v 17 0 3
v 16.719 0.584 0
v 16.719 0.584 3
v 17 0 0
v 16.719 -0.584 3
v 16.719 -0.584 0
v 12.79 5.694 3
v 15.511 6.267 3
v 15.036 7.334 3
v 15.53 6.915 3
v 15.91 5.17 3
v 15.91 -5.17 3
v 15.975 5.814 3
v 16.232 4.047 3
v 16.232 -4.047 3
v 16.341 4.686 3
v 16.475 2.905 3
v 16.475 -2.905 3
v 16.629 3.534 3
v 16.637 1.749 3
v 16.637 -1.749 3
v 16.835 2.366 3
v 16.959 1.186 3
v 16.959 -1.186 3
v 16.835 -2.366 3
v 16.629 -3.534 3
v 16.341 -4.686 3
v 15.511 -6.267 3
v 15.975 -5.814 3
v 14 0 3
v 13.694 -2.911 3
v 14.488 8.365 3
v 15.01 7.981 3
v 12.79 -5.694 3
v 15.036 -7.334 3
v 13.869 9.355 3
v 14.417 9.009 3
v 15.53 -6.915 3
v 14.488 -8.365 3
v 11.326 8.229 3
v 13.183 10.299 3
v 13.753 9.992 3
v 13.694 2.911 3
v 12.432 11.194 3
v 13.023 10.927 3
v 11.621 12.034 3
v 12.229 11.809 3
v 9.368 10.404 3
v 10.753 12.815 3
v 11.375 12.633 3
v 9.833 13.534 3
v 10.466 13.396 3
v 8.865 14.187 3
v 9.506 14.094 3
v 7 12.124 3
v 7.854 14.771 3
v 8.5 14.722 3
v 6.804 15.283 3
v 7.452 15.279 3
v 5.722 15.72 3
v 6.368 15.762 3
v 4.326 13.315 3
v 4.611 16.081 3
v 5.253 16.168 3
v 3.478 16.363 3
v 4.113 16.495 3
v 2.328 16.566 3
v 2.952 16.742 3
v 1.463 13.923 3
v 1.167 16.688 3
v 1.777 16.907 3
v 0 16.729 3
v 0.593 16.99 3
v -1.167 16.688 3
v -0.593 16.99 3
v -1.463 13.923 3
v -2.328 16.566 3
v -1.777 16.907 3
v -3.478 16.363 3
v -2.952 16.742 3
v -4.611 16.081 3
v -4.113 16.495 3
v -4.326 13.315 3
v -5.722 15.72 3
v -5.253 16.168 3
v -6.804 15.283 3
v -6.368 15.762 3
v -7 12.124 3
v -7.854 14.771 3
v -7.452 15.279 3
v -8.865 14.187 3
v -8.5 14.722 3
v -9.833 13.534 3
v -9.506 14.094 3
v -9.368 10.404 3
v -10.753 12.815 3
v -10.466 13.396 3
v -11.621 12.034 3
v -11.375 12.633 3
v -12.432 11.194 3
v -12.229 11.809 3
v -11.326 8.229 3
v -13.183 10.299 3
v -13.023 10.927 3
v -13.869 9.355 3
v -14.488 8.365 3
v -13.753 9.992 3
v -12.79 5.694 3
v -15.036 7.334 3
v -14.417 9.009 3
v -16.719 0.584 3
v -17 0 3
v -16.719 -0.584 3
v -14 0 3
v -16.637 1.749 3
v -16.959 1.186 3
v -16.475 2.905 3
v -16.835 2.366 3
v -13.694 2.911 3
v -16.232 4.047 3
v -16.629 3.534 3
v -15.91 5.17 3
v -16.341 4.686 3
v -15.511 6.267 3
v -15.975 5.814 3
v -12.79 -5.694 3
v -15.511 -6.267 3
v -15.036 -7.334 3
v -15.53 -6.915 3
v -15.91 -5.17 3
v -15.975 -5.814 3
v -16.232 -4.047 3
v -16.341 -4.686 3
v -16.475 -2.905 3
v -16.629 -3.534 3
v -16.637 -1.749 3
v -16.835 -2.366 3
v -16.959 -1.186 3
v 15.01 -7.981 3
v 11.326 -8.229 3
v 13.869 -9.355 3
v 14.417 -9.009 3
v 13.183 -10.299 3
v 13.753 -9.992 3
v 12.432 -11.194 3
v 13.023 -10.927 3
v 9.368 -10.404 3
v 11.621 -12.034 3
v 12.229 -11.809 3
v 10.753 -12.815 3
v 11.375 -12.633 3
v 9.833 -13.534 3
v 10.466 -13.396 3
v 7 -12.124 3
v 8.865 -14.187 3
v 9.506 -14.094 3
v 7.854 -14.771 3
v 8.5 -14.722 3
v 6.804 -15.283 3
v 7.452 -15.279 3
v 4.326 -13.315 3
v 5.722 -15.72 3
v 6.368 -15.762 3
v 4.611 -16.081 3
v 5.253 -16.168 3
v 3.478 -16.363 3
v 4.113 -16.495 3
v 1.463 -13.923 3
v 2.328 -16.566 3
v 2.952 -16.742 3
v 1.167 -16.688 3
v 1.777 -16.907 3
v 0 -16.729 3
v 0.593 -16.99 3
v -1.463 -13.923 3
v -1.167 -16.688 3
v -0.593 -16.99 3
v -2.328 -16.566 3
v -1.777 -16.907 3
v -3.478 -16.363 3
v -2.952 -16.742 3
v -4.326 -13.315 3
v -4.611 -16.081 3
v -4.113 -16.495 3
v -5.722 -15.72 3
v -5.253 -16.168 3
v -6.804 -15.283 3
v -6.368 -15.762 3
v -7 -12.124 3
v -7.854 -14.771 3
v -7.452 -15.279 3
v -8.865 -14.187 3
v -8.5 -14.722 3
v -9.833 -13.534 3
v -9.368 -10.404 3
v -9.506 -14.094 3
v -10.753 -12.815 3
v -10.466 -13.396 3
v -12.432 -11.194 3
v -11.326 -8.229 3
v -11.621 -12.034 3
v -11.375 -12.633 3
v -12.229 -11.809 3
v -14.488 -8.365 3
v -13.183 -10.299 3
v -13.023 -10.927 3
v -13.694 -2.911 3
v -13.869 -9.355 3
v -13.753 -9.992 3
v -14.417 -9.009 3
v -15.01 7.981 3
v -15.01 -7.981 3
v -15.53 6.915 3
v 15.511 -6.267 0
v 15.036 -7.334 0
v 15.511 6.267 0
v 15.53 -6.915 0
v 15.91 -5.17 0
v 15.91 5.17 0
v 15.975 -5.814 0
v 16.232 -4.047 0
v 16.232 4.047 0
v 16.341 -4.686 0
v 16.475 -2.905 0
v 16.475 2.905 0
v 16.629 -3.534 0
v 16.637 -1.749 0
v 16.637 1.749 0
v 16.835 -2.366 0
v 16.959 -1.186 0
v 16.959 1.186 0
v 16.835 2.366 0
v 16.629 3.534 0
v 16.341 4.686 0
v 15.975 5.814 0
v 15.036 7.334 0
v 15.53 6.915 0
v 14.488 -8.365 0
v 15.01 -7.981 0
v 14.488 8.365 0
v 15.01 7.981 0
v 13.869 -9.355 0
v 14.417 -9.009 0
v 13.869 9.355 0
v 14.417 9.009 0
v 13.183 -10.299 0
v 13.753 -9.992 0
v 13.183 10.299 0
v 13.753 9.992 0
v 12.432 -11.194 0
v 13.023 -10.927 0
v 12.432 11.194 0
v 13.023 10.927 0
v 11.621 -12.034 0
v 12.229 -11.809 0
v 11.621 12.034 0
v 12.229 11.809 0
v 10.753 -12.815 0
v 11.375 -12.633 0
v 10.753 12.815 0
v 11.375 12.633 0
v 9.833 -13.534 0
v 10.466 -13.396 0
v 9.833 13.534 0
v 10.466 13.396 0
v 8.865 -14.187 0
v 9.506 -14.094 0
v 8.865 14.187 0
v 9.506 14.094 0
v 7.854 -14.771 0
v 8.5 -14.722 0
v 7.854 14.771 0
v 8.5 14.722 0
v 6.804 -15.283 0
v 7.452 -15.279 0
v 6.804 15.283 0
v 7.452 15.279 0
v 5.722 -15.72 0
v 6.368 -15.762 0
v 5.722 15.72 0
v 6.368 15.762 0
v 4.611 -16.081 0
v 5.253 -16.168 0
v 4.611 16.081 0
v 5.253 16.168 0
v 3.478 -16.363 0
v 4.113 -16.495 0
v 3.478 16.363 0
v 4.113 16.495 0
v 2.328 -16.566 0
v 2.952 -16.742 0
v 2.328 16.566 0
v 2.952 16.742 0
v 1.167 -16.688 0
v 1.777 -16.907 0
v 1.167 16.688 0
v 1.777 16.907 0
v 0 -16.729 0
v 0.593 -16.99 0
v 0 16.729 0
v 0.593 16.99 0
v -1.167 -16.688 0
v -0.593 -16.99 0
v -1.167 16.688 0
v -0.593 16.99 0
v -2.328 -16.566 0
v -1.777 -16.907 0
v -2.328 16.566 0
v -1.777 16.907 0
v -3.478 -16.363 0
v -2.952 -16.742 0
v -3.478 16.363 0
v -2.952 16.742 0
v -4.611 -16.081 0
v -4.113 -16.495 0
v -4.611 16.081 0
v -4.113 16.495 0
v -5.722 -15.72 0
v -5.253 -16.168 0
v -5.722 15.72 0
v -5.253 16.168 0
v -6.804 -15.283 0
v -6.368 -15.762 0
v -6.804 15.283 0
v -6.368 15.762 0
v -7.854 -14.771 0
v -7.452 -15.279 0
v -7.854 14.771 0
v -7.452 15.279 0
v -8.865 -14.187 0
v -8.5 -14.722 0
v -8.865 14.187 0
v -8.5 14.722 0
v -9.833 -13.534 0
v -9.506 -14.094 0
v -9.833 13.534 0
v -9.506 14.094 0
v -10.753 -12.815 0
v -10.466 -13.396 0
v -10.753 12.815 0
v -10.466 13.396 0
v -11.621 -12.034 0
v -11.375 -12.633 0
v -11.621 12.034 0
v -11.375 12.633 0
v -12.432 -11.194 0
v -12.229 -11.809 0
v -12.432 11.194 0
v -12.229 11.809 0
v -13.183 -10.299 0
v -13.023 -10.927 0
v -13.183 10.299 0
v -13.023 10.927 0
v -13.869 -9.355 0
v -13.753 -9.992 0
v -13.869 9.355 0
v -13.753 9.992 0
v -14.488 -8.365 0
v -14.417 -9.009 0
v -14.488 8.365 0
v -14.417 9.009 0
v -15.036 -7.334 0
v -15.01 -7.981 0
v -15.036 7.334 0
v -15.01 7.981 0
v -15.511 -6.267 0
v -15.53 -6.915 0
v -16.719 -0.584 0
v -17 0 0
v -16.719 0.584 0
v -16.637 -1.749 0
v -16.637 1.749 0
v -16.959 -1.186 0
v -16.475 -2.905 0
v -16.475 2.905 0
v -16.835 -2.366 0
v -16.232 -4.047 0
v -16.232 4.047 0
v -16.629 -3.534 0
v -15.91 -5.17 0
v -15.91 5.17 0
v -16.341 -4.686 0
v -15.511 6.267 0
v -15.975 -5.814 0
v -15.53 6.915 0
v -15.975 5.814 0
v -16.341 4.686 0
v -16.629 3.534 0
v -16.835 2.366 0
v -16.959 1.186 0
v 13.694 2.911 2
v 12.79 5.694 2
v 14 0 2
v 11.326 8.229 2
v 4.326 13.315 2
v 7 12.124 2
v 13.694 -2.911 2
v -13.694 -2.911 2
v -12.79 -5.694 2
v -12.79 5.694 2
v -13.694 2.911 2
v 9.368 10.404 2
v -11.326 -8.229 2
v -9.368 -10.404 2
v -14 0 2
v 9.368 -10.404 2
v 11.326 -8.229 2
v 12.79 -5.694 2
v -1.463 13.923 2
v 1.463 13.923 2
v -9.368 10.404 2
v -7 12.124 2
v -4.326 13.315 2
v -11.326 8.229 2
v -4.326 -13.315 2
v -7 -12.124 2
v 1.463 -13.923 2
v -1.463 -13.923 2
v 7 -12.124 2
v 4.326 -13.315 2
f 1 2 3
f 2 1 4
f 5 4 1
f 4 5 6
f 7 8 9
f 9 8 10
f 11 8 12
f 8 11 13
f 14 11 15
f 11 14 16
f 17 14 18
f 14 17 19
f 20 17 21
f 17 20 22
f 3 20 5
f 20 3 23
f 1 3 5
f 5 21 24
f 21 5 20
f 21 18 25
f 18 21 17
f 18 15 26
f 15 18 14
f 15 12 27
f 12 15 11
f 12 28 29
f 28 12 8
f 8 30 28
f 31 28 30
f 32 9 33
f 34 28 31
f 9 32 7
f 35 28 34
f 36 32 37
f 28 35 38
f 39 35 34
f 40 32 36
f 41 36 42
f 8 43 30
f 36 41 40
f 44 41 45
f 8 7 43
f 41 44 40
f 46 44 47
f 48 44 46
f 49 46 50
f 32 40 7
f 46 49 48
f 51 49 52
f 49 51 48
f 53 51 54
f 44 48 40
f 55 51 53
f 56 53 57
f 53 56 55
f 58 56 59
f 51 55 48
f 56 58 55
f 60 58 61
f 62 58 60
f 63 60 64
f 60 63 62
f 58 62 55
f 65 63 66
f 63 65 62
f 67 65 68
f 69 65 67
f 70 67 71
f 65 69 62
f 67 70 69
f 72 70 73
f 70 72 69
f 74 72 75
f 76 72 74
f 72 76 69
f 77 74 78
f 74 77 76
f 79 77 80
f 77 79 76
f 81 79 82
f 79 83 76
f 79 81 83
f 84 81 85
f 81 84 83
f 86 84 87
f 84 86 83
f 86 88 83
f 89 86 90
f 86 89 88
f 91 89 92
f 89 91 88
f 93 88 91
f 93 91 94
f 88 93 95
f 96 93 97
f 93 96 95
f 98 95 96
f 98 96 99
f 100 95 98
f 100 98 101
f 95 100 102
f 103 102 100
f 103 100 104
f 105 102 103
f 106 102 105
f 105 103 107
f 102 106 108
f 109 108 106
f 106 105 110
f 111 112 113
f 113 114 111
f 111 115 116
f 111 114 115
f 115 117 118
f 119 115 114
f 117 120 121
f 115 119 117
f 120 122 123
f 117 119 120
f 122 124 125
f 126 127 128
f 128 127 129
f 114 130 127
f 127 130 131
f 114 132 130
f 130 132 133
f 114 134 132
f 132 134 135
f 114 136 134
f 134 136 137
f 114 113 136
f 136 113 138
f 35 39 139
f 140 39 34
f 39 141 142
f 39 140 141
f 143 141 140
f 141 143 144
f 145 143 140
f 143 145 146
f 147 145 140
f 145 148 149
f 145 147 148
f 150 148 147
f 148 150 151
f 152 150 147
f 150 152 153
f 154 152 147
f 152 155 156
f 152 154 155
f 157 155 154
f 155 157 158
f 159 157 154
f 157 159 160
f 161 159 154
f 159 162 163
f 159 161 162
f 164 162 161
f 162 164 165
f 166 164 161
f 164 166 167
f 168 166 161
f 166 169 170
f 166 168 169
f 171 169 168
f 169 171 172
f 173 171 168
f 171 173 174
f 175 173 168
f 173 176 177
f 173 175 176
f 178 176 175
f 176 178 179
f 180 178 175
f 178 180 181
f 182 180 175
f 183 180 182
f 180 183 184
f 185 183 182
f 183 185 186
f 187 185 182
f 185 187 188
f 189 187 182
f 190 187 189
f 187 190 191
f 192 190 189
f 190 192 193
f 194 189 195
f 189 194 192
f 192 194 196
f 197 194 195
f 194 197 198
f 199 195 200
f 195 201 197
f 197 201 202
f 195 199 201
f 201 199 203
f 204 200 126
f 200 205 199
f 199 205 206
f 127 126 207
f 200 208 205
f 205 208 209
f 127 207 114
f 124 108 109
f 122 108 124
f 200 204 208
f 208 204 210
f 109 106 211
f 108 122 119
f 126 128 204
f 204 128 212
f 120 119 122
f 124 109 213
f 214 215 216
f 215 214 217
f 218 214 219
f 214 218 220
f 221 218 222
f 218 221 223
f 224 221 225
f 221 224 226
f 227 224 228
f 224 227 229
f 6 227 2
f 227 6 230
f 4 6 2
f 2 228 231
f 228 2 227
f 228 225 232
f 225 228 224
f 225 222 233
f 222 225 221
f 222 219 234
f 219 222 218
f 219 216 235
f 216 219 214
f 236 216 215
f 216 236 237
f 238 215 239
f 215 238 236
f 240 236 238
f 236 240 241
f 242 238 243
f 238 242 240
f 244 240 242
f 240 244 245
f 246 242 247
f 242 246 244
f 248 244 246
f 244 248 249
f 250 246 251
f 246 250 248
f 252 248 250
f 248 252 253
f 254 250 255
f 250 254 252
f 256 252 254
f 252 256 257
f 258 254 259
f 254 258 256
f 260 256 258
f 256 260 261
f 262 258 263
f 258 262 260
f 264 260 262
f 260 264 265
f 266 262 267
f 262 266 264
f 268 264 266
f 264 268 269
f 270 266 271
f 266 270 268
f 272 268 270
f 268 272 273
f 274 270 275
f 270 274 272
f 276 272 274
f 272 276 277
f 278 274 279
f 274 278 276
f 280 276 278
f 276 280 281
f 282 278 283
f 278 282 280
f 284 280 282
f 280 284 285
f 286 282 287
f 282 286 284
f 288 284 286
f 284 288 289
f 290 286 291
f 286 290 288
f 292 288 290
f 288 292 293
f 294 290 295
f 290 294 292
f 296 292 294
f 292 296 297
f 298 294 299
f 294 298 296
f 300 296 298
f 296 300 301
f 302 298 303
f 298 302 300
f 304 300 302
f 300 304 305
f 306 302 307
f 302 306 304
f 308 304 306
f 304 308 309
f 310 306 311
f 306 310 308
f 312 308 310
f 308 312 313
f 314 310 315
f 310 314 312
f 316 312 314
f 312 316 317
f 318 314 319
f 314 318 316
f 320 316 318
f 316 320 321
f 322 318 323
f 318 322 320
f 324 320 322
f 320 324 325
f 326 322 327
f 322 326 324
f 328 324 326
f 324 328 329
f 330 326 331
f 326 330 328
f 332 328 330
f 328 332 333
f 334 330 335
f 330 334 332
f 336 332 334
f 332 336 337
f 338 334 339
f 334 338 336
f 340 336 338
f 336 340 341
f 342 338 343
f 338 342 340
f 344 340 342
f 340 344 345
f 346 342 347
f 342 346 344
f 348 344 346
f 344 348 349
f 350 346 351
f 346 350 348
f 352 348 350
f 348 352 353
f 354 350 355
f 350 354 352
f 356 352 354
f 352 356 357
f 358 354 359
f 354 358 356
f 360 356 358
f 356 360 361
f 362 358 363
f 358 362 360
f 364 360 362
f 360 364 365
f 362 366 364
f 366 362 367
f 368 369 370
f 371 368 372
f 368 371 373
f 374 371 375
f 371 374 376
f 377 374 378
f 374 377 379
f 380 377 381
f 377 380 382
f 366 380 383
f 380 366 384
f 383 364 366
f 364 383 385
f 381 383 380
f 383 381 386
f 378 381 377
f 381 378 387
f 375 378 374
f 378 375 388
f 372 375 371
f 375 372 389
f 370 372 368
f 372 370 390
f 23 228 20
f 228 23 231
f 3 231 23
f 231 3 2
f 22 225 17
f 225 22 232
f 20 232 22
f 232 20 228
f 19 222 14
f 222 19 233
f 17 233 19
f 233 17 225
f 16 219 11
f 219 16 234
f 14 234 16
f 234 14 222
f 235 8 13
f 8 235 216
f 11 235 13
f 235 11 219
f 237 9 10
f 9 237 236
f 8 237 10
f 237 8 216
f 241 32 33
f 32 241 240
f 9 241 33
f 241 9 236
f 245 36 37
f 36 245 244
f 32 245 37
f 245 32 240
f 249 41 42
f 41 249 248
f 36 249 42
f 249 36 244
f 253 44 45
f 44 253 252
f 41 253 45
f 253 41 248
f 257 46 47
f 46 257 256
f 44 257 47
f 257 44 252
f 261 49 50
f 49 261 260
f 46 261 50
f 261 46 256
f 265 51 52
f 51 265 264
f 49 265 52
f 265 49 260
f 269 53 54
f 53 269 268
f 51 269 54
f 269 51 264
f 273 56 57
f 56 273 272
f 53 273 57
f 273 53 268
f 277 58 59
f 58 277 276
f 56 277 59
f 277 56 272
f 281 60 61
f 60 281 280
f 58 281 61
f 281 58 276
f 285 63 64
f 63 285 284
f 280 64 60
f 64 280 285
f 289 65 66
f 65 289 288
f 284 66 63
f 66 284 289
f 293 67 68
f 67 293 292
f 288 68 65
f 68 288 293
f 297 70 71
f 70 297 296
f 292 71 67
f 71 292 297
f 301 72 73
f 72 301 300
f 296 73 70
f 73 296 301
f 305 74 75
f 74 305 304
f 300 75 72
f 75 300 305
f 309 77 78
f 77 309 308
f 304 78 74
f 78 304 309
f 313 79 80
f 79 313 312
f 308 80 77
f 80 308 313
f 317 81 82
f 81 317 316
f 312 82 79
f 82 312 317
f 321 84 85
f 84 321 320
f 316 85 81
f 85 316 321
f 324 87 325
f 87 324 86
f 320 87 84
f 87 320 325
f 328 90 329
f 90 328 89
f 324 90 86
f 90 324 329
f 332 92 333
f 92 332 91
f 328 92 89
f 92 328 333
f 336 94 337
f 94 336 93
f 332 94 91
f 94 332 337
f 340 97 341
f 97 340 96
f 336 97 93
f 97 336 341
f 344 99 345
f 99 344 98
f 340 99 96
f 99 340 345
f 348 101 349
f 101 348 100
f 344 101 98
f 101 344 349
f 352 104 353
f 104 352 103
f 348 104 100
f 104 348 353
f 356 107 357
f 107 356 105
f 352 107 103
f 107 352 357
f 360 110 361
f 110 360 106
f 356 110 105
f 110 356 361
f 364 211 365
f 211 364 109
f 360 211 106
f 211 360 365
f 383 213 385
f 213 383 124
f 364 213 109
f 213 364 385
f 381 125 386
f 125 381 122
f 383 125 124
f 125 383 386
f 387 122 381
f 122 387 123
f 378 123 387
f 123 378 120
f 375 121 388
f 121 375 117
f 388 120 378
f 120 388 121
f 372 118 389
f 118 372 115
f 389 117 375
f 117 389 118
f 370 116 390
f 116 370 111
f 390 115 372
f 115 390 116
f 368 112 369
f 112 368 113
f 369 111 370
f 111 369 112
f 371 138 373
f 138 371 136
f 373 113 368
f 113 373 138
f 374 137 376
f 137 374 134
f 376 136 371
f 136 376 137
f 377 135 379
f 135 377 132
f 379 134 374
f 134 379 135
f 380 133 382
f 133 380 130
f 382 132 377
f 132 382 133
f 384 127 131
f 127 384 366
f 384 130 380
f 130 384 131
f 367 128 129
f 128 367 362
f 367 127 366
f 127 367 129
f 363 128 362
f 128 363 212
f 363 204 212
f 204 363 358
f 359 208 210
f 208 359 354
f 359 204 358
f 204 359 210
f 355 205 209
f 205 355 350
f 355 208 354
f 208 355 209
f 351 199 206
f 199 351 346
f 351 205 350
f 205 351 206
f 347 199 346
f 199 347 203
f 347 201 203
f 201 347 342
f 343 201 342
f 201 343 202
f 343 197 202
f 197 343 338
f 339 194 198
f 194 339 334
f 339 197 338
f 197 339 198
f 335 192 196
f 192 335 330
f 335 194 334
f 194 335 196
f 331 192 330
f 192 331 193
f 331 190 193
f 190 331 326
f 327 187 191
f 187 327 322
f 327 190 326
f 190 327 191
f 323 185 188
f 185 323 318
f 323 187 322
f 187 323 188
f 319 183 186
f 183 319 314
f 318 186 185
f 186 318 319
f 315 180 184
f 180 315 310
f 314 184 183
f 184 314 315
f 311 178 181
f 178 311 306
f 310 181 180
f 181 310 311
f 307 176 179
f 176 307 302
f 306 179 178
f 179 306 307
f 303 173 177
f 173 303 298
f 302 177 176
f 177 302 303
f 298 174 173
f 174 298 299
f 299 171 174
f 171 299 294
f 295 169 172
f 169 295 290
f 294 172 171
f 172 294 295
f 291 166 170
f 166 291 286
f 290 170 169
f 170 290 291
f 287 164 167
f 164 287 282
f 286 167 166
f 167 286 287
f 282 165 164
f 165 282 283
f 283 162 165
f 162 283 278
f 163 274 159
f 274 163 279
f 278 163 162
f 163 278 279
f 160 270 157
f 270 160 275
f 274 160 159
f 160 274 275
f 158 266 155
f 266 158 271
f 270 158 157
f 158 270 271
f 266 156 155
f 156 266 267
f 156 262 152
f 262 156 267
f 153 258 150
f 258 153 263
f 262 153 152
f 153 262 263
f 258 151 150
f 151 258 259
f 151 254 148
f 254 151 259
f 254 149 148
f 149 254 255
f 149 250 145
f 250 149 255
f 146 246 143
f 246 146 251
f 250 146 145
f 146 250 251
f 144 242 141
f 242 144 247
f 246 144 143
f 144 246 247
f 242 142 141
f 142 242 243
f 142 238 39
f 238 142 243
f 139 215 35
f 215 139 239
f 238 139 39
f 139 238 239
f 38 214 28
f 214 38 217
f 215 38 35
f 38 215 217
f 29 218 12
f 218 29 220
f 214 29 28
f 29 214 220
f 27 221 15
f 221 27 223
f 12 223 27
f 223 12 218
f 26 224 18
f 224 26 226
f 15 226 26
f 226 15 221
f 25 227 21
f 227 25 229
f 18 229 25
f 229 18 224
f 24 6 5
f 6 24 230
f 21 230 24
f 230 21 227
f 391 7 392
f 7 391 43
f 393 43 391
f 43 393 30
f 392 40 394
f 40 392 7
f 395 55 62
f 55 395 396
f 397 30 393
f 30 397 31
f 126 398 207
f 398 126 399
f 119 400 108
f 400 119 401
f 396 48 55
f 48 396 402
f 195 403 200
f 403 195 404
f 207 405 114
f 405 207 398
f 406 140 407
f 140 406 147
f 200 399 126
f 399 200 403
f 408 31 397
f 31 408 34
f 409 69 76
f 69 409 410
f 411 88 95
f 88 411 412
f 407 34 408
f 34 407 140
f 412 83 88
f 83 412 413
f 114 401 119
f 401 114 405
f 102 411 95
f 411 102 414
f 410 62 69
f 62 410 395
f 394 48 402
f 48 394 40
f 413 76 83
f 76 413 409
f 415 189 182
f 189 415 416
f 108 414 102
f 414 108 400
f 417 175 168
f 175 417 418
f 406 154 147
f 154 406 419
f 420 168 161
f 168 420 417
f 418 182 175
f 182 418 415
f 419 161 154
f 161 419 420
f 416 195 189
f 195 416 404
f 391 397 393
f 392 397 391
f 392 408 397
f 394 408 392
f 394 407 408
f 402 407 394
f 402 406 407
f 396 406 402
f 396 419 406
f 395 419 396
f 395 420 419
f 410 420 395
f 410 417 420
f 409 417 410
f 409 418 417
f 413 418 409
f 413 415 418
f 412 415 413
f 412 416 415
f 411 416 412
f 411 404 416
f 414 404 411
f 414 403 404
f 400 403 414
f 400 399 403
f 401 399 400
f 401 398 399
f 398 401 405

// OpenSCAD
// file: coin-lib.scad
/*
 * Simple coin shape
 *
 * Copyright (c) 2012 Mark Hindess
 *
 * Creative Commons Attribution-NonCommercial-ShareAlike 3.0 Unported License:
 *
 *   http://creativecommons.org/licenses/by-nc-sa/3.0/
 */

module coin(height = 3, radius = 17,
            cut_radius = 14, cut_height = 1,
            bumps = 90, bump_radius = 2) {
  deg = 360/bumps;
  difference() {
    union() {
      for(n=[0:bumps-1]) {
        rotate([0, 0, n*deg])
          translate([radius-bump_radius, 0, 0])
            cylinder(r = bump_radius, h = height);
      }
      cylinder(r = radius-bump_radius, h = height);
    }
    translate([0, 0, height-cut_height])
      cylinder(r = cut_radius, h = height-cut_height);
  }
}

coin();
// main file
/*
 * Skull and Crossbones coin
 *
 * Copyright (c) 2012 Mark Hindess
 *
 * Creative Commons Attribution-NonCommercial-ShareAlike 3.0 Unported License:
 *
 *   http://creativecommons.org/licenses/by-nc-sa/3.0/
 */

use <coin-lib.scad>
coin();
translate([-11,-10,2])
  scale([0.26,0.26,1])
    linear_extrude(file = "skull-and-x-bones.dxf", height = 2, center = true);
